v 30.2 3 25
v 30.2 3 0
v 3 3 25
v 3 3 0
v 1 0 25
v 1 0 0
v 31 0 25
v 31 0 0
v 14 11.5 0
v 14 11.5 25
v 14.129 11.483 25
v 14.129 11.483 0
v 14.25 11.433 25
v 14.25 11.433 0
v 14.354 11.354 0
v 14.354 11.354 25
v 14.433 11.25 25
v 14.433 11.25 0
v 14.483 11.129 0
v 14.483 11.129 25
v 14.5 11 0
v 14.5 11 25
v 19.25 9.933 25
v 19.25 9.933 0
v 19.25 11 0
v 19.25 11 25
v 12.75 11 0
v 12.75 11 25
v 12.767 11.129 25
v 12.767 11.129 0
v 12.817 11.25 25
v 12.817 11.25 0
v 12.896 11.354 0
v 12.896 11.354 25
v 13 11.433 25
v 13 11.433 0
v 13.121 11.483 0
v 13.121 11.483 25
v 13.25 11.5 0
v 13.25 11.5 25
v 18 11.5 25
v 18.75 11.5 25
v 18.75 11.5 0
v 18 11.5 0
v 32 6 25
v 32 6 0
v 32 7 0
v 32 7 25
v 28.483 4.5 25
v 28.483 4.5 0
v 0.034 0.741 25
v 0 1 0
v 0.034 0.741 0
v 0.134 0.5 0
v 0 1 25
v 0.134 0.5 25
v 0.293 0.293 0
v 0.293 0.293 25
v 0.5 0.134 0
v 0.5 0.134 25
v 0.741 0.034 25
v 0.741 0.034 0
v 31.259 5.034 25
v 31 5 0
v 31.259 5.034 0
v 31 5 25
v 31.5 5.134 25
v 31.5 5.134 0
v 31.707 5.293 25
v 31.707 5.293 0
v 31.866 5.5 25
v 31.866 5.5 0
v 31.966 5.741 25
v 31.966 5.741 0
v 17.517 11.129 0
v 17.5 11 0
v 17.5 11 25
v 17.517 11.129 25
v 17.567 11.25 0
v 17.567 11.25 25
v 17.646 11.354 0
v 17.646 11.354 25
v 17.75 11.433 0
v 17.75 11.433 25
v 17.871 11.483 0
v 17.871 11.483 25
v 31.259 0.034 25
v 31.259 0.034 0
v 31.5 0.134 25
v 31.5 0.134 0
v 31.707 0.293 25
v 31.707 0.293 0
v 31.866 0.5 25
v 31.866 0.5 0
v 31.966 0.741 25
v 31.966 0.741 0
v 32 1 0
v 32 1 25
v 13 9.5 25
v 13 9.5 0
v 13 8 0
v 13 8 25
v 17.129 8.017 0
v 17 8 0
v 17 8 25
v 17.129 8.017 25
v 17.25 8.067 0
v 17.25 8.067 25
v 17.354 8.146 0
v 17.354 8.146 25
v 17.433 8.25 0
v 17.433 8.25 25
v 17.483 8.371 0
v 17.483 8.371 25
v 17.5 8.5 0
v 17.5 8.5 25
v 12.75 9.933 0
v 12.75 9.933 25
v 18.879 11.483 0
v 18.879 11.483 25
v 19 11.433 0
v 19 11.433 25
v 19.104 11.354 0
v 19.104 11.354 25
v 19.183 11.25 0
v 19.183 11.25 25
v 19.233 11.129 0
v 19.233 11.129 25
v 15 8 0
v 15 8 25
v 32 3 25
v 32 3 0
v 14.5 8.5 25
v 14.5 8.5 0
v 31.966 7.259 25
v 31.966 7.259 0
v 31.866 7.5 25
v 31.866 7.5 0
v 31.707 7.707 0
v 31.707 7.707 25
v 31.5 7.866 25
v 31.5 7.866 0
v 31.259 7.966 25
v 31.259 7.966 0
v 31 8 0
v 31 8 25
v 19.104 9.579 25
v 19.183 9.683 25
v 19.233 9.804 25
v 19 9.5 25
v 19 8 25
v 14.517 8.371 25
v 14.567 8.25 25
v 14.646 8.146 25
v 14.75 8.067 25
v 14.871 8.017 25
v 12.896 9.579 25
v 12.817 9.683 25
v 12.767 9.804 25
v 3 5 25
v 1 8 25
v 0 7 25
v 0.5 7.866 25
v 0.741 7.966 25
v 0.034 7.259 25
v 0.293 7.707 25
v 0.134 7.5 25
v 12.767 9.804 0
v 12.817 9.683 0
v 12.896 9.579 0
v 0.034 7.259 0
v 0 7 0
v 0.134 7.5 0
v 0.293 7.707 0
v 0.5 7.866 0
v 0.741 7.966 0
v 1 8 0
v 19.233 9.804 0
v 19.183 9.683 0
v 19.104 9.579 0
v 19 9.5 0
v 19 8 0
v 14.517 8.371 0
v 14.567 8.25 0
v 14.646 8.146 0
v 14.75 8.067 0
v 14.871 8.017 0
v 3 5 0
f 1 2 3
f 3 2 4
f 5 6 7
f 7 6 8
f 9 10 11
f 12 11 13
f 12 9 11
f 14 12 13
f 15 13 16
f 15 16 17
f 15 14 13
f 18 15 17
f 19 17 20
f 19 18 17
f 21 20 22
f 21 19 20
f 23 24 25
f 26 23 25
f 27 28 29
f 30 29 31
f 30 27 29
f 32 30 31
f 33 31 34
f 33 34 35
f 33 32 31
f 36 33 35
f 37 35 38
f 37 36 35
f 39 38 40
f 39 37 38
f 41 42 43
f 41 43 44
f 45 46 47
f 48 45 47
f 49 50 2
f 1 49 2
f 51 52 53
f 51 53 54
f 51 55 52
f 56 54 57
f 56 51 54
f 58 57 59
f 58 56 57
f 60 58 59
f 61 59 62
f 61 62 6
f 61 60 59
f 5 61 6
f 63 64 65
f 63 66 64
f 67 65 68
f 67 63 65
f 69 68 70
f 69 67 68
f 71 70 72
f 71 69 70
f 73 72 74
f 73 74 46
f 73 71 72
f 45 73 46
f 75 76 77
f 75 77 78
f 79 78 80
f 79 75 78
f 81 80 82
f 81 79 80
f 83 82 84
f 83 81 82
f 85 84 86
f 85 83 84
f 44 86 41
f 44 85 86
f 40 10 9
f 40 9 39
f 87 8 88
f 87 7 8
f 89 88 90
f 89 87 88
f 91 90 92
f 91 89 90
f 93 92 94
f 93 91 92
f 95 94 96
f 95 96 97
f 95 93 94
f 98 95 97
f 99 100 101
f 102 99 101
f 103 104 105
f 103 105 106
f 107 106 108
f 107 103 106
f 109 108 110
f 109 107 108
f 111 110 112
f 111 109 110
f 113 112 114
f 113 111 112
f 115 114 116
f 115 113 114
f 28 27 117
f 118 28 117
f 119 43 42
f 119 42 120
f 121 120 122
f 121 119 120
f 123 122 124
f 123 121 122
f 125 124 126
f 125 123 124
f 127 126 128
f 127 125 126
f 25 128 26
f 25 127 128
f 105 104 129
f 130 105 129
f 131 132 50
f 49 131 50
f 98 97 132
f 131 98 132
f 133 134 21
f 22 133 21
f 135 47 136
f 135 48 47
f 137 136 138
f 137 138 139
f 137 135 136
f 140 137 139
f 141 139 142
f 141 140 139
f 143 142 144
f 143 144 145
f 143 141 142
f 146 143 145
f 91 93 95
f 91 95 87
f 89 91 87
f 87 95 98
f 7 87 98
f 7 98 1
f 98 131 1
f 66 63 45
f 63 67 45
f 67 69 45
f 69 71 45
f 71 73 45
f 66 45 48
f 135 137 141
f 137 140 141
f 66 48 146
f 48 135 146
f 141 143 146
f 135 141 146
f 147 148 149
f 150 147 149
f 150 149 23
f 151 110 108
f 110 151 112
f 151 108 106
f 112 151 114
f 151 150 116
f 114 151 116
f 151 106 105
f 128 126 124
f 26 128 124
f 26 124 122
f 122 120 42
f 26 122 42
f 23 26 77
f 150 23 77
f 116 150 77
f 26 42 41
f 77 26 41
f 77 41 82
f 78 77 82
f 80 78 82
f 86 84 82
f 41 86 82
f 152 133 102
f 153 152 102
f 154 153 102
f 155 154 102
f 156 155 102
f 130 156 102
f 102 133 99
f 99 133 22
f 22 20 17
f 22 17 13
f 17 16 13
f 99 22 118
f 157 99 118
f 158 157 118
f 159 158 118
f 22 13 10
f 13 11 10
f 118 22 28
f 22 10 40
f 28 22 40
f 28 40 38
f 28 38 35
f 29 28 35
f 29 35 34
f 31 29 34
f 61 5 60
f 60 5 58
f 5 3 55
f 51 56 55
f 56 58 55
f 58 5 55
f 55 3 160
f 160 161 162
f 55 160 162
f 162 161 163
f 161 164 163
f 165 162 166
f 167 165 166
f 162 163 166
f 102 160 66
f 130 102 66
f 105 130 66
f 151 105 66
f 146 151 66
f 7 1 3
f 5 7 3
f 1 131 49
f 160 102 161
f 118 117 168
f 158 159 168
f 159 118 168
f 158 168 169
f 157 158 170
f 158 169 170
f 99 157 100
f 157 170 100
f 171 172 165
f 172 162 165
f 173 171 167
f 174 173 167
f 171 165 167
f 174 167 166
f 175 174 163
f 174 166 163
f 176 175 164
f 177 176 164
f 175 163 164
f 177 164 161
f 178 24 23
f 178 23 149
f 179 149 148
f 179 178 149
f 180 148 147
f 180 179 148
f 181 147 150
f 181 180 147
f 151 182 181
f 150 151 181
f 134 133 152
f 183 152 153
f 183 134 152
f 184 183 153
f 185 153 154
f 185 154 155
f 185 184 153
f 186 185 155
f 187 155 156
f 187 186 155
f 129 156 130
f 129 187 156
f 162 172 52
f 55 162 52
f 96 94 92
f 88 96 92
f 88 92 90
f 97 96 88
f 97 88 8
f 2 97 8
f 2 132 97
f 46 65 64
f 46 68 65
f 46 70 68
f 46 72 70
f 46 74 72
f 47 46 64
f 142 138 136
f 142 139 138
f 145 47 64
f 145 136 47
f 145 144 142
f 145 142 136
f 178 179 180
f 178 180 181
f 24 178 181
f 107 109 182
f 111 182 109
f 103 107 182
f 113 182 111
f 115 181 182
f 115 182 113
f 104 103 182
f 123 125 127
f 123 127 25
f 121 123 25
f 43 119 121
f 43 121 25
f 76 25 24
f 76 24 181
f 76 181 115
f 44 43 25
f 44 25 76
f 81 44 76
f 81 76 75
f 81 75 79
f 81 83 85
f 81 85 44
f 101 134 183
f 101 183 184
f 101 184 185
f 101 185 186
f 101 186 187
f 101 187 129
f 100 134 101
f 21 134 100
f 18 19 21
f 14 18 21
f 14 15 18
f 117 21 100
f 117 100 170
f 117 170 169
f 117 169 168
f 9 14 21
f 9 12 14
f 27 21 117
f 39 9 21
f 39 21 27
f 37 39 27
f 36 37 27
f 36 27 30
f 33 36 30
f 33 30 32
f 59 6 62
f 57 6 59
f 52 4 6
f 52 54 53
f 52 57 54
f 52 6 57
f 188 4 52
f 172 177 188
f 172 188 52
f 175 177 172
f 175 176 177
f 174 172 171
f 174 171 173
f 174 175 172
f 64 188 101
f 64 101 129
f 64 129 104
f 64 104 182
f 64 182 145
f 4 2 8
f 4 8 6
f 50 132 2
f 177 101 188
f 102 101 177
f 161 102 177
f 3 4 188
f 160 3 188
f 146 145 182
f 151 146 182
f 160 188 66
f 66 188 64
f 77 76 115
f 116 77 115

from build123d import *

# Parameters (mm, degrees)
F1_DEPTH     = 25
F2_R         = 1
F3_T1_DEPTH  = 25
F3_T3_DEPTH  = 25
F3_T5_DEPTH  = 27.1650635095
F3_T7_DEPTH  = 27.5
F3_T9_DEPTH  = 27.5
F3_T11_DEPTH = 27.5
F3_T13_DEPTH = 27.5
F3_T15_DEPTH = 27.1650635095


# Not quite as in the source:
# - a fillet or chamfer that OpenCascade refuses, or shapes differently, is made with other operations: its cross-section is extruded or revolved along the edge and cut away or added


with BuildPart() as f1:
    # F0 (on Top) → F1 (new body)
    with BuildSketch(Plane.XY):
        Polygon((0, 8), (0, 0), (32, 0), (32, 3), (30.2, 3), (3, 3), (3, 5), (32, 5), (32, 8), (19, 8), (19, 9.5), (19.25, 9.5), (19.25, 11.5), (17.5, 11.5), (17.5, 8), (14.5, 8), (14.5, 11.5), (12.75, 11.5), (12.75, 9.5), (13, 9.5), (13, 8), align=None)
        Polygon((30.2, 3), (32, 3), (28.4834179878, 4.5), align=None)
    extrude(amount=F1_DEPTH)

    # F2
    f2_edges = [f1.edges().sort_by_distance(p)[0] for p in [
        (32, 8, 12.5),
        (32, 5, 12.5),
        (32, 0, 12.5),
        (0, 0, 12.5),
        (0, 8, 12.5),
    ]]
    fillet(f2_edges, radius=F2_R)

    # F3: fillet of radius 0.5 on 8 edges, made by hand

    # F3_s2 → F3_t1 (join)
    with BuildSketch(Plane.XY):
        with BuildLine():
            ThreePointArc((14.5, 8.5), (14.6464466094, 8.1464466094), (15, 8))
            Line((15, 8), (14.5, 8))
            Line((14.5, 8), (14.5, 8.5))
        make_face()
    extrude(amount=F3_T1_DEPTH)

    # F3_s4 → F3_t3 (join)
    with BuildSketch(Plane.XY):
        with BuildLine():
            ThreePointArc((17, 8), (17.3535533906, 8.1464466094), (17.5, 8.5))
            Line((17.5, 8.5), (17.5, 8))
            Line((17.5, 8), (17, 8))
        make_face()
    extrude(amount=F3_T3_DEPTH)

    # F3_s6 → F3_t5 (cut)
    with BuildSketch(Plane.XY.offset(-1.0825317547)):
        with BuildLine():
            ThreePointArc((12.75, 9.9330127019), (12.8169872981, 9.6830127019), (13, 9.5))
            Line((13, 9.5), (12.75, 9.5))
            Line((12.75, 9.5), (12.75, 9.9330127019))
        make_face()
    extrude(amount=F3_T5_DEPTH, mode=Mode.SUBTRACT)

    # F3_s8 → F3_t7 (cut)
    with BuildSketch(Plane.XY.offset(-1.25)):
        with BuildLine():
            ThreePointArc((12.75, 11), (12.8964466094, 11.3535533906), (13.25, 11.5))
            Line((13.25, 11.5), (12.75, 11.5))
            Line((12.75, 11.5), (12.75, 11))
        make_face()
    extrude(amount=F3_T7_DEPTH, mode=Mode.SUBTRACT)

    # F3_s10 → F3_t9 (cut)
    with BuildSketch(Plane.XY.offset(-1.25)):
        with BuildLine():
            ThreePointArc((14, 11.5), (14.3535533906, 11.3535533906), (14.5, 11))
            Line((14.5, 11), (14.5, 11.5))
            Line((14.5, 11.5), (14, 11.5))
        make_face()
    extrude(amount=F3_T9_DEPTH, mode=Mode.SUBTRACT)

    # F3_s12 → F3_t11 (cut)
    with BuildSketch(Plane.XY.offset(-1.25)):
        with BuildLine():
            ThreePointArc((17.5, 11), (17.6464466094, 11.3535533906), (18, 11.5))
            Line((18, 11.5), (17.5, 11.5))
            Line((17.5, 11.5), (17.5, 11))
        make_face()
    extrude(amount=F3_T11_DEPTH, mode=Mode.SUBTRACT)

    # F3_s14 → F3_t13 (cut)
    with BuildSketch(Plane.XY.offset(-1.25)):
        with BuildLine():
            ThreePointArc((18.75, 11.5), (19.1035533906, 11.3535533906), (19.25, 11))
            Line((19.25, 11), (19.25, 11.5))
            Line((19.25, 11.5), (18.75, 11.5))
        make_face()
    extrude(amount=F3_T13_DEPTH, mode=Mode.SUBTRACT)

    # F3_s16 → F3_t15 (cut)
    with BuildSketch(Plane.XY.offset(-1.0825317547)):
        with BuildLine():
            ThreePointArc((19.25, 9.9330127019), (19.1830127019, 9.6830127019), (19, 9.5))
            Line((19, 9.5), (19.25, 9.5))
            Line((19.25, 9.5), (19.25, 9.9330127019))
        make_face()
    extrude(amount=F3_T15_DEPTH, mode=Mode.SUBTRACT)


solid = f1.part
